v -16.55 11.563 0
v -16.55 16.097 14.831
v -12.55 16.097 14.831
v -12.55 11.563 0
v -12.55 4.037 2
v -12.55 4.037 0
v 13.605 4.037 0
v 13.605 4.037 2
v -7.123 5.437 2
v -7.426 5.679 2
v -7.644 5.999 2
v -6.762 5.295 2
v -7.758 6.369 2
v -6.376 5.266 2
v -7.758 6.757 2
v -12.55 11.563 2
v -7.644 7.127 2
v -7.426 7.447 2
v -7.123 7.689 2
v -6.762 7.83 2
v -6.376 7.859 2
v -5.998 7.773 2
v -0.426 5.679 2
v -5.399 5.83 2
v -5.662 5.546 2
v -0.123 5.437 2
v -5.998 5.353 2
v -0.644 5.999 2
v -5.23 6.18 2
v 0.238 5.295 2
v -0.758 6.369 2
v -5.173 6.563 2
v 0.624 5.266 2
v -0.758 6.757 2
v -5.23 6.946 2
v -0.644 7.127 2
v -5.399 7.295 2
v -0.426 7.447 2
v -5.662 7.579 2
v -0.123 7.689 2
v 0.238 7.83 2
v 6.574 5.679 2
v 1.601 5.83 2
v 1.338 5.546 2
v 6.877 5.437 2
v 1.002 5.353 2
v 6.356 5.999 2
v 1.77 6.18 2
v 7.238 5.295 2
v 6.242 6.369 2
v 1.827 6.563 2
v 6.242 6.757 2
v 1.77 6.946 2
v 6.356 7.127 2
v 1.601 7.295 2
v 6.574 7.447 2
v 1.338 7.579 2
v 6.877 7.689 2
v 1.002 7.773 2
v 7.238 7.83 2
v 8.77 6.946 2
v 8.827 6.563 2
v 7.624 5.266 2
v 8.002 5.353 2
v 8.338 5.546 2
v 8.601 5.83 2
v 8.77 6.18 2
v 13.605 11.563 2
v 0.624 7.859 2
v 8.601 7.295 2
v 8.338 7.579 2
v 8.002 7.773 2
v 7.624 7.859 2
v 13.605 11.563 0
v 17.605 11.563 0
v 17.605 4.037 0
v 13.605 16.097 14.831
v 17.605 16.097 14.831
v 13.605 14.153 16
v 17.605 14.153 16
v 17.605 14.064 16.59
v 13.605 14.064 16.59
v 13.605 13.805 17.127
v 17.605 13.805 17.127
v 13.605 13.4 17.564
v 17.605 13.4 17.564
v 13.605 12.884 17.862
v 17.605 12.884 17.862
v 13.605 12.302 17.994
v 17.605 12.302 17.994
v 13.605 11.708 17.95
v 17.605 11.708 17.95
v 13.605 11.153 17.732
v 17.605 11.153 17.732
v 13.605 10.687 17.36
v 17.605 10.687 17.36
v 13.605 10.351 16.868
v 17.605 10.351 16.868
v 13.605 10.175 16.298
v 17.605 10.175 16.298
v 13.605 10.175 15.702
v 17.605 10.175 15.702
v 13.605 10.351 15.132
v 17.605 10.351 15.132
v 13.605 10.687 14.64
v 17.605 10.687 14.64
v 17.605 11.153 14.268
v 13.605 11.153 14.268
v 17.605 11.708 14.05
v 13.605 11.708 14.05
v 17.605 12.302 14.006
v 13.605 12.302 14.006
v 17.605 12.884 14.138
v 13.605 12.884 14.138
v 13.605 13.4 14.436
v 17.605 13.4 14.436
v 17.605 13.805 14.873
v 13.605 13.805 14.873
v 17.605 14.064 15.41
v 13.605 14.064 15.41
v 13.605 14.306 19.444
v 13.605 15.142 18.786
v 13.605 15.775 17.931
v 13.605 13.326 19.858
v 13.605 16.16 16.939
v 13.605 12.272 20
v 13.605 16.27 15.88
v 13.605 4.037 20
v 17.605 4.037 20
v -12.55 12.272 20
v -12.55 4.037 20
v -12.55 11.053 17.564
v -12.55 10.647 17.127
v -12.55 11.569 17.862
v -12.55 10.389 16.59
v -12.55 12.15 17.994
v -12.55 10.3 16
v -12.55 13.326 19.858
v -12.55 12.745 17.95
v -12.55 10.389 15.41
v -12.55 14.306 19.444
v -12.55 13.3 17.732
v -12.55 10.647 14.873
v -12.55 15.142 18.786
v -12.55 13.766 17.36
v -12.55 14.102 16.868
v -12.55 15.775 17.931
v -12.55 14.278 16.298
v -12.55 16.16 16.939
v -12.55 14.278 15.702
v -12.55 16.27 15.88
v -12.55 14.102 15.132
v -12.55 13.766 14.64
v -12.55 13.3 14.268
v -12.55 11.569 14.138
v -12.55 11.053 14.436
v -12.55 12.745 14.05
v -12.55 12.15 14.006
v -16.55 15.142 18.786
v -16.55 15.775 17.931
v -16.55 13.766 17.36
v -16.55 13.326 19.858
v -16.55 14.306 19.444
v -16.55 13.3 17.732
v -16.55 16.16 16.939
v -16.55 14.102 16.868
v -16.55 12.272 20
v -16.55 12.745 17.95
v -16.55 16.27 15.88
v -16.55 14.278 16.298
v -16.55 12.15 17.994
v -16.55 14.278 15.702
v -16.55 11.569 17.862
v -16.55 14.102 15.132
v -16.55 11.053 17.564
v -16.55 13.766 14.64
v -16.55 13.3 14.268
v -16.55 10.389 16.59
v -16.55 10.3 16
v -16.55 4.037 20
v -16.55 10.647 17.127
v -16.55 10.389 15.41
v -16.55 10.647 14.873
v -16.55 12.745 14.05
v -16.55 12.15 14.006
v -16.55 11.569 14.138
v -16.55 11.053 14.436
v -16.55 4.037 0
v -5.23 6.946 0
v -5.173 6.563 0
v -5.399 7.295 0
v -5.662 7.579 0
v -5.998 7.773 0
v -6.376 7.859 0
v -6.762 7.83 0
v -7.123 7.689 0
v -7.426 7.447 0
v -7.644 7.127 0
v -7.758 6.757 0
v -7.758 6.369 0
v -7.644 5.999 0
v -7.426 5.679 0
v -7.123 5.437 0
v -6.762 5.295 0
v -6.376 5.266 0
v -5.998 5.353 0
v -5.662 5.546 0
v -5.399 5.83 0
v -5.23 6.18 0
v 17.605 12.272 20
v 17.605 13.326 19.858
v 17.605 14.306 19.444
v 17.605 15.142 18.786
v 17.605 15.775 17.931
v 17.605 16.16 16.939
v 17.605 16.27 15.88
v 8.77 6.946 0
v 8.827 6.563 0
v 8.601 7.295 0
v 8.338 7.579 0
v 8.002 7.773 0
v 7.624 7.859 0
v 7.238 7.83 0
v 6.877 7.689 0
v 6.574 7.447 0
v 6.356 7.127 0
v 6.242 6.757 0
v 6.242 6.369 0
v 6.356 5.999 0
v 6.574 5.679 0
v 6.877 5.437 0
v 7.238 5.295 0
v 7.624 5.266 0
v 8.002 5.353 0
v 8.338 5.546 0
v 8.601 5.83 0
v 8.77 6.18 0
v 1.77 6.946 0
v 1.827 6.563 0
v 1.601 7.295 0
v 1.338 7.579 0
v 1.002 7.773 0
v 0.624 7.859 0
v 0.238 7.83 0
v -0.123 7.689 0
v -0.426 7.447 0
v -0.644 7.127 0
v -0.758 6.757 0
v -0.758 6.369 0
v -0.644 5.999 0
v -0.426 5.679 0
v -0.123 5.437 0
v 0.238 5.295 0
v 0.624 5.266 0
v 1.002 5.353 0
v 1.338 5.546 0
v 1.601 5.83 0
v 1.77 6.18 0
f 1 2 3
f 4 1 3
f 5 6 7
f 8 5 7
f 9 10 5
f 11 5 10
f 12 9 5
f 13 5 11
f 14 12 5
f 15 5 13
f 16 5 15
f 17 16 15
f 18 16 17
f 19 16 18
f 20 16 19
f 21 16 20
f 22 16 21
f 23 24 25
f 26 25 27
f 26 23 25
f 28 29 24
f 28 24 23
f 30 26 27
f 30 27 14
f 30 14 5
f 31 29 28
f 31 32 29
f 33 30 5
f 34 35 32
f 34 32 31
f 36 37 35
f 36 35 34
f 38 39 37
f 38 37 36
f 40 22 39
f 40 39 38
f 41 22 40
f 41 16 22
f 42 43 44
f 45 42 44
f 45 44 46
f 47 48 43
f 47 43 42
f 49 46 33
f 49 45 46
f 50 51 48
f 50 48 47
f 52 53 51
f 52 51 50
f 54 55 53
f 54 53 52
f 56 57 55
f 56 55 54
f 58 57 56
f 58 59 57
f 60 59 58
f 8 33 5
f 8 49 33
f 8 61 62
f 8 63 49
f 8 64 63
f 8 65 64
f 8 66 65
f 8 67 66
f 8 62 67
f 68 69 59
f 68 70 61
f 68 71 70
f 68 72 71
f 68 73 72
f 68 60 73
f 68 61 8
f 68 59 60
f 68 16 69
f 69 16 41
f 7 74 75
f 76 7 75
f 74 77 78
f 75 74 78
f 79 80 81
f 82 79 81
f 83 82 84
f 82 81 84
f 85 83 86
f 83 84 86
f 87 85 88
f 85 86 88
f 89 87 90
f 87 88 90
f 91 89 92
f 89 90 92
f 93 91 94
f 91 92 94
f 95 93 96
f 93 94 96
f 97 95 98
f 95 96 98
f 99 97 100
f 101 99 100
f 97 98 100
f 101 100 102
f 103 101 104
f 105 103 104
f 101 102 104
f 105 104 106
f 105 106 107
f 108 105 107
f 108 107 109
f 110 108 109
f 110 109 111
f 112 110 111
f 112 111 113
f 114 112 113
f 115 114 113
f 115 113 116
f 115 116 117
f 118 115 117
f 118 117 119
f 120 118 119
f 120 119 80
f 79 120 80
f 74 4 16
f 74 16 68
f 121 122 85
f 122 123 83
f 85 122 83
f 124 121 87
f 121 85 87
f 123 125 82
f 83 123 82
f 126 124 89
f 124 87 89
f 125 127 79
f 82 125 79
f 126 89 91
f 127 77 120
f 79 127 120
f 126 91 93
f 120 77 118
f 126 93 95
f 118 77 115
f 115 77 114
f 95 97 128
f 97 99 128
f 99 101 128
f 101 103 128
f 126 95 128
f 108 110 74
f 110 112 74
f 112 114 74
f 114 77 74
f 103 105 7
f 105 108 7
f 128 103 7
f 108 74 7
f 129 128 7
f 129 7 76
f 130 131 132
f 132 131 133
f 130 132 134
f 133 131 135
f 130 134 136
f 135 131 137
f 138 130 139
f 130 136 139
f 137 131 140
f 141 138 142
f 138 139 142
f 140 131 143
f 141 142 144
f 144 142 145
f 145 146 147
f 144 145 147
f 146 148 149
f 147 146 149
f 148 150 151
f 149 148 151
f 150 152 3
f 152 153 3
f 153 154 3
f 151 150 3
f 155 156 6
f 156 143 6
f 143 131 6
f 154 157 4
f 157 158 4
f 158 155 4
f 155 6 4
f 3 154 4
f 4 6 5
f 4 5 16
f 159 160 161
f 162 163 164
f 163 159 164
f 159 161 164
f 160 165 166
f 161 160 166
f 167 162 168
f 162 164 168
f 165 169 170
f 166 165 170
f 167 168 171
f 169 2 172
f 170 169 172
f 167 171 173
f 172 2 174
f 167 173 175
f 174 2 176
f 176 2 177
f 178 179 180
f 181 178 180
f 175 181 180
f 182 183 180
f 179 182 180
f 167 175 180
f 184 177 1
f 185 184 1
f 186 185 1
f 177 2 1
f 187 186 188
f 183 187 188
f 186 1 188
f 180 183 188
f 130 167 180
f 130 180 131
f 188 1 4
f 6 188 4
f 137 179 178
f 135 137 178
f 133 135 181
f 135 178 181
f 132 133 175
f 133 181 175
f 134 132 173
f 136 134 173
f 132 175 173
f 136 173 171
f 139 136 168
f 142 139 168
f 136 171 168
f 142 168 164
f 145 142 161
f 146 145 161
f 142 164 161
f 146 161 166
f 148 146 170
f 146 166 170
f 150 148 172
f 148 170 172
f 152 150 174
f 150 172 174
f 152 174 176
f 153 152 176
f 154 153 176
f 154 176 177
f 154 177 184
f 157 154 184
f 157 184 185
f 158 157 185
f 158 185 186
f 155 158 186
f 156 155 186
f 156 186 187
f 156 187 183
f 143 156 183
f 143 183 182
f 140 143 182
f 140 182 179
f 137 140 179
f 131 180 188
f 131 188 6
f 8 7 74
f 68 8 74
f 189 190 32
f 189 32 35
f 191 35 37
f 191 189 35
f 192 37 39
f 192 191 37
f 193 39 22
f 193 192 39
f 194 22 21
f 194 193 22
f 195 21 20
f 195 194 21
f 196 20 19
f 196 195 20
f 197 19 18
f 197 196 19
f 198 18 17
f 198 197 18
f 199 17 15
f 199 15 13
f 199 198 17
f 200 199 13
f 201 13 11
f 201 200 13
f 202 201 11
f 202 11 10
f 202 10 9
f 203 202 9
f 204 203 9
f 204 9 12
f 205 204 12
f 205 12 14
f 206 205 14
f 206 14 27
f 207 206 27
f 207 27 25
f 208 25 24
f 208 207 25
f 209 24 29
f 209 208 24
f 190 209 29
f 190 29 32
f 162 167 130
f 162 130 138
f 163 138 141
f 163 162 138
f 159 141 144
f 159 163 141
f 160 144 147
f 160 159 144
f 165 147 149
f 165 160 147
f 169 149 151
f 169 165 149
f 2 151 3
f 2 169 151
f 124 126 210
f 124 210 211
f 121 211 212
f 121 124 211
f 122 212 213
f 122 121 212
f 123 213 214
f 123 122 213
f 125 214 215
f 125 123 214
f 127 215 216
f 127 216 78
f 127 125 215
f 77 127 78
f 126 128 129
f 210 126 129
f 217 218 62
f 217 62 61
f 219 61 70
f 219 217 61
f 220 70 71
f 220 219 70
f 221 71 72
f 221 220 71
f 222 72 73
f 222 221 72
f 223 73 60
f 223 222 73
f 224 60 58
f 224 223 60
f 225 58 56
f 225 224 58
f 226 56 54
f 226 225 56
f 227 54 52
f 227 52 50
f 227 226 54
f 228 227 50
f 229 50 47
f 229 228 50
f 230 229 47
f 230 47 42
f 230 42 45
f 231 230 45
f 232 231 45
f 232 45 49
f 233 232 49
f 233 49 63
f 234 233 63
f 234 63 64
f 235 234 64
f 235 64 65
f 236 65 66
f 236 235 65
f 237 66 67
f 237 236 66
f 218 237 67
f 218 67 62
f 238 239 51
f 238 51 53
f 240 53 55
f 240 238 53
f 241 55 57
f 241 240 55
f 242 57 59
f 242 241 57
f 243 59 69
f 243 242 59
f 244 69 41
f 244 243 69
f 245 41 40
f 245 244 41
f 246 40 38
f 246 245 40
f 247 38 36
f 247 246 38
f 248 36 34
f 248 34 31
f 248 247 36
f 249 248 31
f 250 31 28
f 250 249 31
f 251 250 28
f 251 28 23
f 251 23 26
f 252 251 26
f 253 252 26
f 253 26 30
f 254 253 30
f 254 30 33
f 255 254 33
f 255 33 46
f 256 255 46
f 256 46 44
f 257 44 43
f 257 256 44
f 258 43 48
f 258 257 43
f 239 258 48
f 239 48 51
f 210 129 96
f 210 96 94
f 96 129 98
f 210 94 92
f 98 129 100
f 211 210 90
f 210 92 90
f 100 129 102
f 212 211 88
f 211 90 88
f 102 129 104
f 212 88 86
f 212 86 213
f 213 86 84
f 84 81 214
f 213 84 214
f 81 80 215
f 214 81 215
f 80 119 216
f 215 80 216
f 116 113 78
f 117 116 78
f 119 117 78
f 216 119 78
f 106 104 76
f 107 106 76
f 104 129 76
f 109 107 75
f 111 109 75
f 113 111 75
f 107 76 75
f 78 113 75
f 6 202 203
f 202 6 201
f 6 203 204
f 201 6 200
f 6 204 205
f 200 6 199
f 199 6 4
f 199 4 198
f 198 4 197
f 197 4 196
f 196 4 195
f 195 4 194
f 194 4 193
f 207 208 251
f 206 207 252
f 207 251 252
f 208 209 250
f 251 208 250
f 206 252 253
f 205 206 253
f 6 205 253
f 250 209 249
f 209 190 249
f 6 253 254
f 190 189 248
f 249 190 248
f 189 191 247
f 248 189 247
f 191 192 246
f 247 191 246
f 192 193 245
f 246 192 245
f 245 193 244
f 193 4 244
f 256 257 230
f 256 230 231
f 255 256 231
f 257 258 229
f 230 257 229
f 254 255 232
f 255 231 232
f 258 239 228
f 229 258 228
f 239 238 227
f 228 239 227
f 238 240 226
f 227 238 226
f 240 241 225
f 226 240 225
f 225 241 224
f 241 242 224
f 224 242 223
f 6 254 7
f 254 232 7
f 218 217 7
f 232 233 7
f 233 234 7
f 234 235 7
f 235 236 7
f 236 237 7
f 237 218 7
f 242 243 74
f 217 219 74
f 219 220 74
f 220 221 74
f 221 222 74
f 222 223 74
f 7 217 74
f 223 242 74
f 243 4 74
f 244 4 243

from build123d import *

# Parameters (mm, degrees)
F0_W           = 4
F0_H           = 7.5257653005
F0_H_2         = 5
F1_DEPTH       = 20
F0_W_2         = 26.1546501577
F0_R           = 1.3
F2_DEPTH       = 2
F3_SIZE2       = 16.3542630924
F3_SIZE        = 5
F4_SIZE2       = 16.3542630924
F4_SIZE        = 5
F5_R           = 2
F6_DEPTH       = 5.8
F7_R           = 2
F8_DEPTH       = 7.32
F9_T1_DEPTH    = 24
F9_2_T1_DEPTH  = 24
F10_T1_DEPTH   = 32.2377661773
F10_2_T1_DEPTH = 32.2377661773


# Not quite as in the source:
# - a fillet or chamfer that OpenCascade refuses, or shapes differently, is made with other operations: its cross-section is extruded or revolved along the edge and cut away or added


with BuildPart() as f1:
    # F0 (on Top) → F1 (new body)
    with BuildSketch(Plane.XY):
        with Locations((-14.5500070333, 7.7998988752)):
            Rectangle(F0_W, F0_H)
        with Locations((-14.5500070333, 14.0627815254)):
            Rectangle(F0_W, F0_H_2)
    extrude(amount=F1_DEPTH)

    # F3
    f3_edges = [f1.edges().sort_by_distance(p)[0] for p in [
        (-14.550007, 16.562782, 0),
    ]]
    f3_side = f1.faces().sort_by_distance((-14.550007, 10.299899, 0))[0]
    chamfer(f3_edges, length=F3_SIZE, length2=F3_SIZE2, reference=f3_side)

    # F5 (on face) → F6 (cut)
    with BuildSketch(Plane(origin=(-16.5500070333, 0, 0), x_dir=(0, -1, 0), z_dir=(-1, 0, 0))):
        with Locations((-12.2998988752, 16)):
            Circle(F5_R)
    extrude(amount=-F6_DEPTH, mode=Mode.SUBTRACT)

    # F9#2: fillet of radius 4 on 1 edges, made by hand

    # F9_2_s2 → F9_2_t1 (cut)
    with BuildSketch(Plane.YZ.offset(-26.5500070333)):
        with BuildLine():
            ThreePointArc((16.5627815254, 16), (15.3912086502, 18.8284271247), (12.5627815254, 20))
            Line((12.5627815254, 20), (16.5627815254, 20))
            Line((16.5627815254, 20), (16.5627815254, 16))
        make_face()
    extrude(amount=F9_2_T1_DEPTH, mode=Mode.SUBTRACT)

    # F10#2: fillet of radius 4 on 1 edges, made by hand

    # F10_2_s2 → F10_2_t1 (cut)
    with BuildSketch(Plane.YZ.offset(-30.668890122)):
        with BuildLine():
            ThreePointArc((12.2717054028, 20), (15.4871328453, 18.379291147), (16.0969244267, 14.8305131811))
            Line((16.0969244267, 14.8305131811), (16.479446329, 14.7135644992))
            Line((16.479446329, 14.7135644992), (16.932966821, 16.196963188))
            Line((16.932966821, 16.196963188), (16.949211258, 16.3453030569))
            ThreePointArc((16.949211258, 16.3453030569), (12.5627815254, 20.4), (12.2717054028, 20.4))
            Line((12.2717054028, 20.4), (12.2717054028, 20))
        make_face()
    extrude(amount=F10_2_T1_DEPTH, mode=Mode.SUBTRACT)


with BuildPart() as f1b:
    # F0 (on Top) → F1, piece 2 (new body)
    with BuildSketch(Plane.XY):
        with Locations((15.6046431243, 7.7998988752)):
            Rectangle(F0_W, F0_H)
        with Locations((15.6046431243, 14.0627815254)):
            Rectangle(F0_W, F0_H_2)
    extrude(amount=F1_DEPTH)

    # F4
    f4_edges = [f1b.edges().sort_by_distance(p)[0] for p in [
        (15.604643, 16.562782, 0),
    ]]
    f4_side = f1b.faces().sort_by_distance((15.604643, 10.299899, 0))[0]
    chamfer(f4_edges, length=F4_SIZE, length2=F4_SIZE2, reference=f4_side)

    # F7 (on face) → F8 (cut)
    with BuildSketch(Plane.YZ.offset(17.6046431243)):
        with Locations((12.1530162249, 16)):
            Circle(F7_R)
    extrude(amount=-F8_DEPTH, mode=Mode.SUBTRACT)

    # F9: fillet of radius 4 on 1 edges, made by hand

    # F9_s2 → F9_t1 (cut)
    with BuildSketch(Plane.YZ.offset(3.6046431243)):
        with BuildLine():
            ThreePointArc((16.5627815254, 16), (15.3912086502, 18.8284271247), (12.5627815254, 20))
            Line((12.5627815254, 20), (16.5627815254, 20))
            Line((16.5627815254, 20), (16.5627815254, 16))
        make_face()
    extrude(amount=F9_T1_DEPTH, mode=Mode.SUBTRACT)

    # F10: fillet of radius 4 on 1 edges, made by hand

    # F10_s2 → F10_t1 (cut)
    with BuildSketch(Plane.YZ.offset(-0.5142399643)):
        with BuildLine():
            ThreePointArc((12.2717054028, 20), (15.4871328453, 18.379291147), (16.0969244267, 14.8305131811))
            Line((16.0969244267, 14.8305131811), (16.479446329, 14.7135644992))
            Line((16.479446329, 14.7135644992), (16.932966821, 16.196963188))
            Line((16.932966821, 16.196963188), (16.949211258, 16.3453030569))
            ThreePointArc((16.949211258, 16.3453030569), (12.5627815254, 20.4), (12.2717054028, 20.4))
            Line((12.2717054028, 20.4), (12.2717054028, 20))
        make_face()
    extrude(amount=F10_T1_DEPTH, mode=Mode.SUBTRACT)


with BuildPart() as f2:
    # F0 (on Top) → F2 (new body)
    with BuildSketch(Plane.XY):
        with Locations((0.5273180455, 7.7998988752)):
            Rectangle(F0_W_2, F0_H)
        with Locations((-6.4726819545, 6.5627815254)):
            Circle(F0_R, mode=Mode.SUBTRACT)
        with Locations((0.5273180455, 6.5627815254)):
            Circle(F0_R, mode=Mode.SUBTRACT)
        with Locations((7.5273180455, 6.5627815254)):
            Circle(F0_R, mode=Mode.SUBTRACT)
    extrude(amount=F2_DEPTH)


solid = Compound([f1.part, f1b.part, f2.part])
